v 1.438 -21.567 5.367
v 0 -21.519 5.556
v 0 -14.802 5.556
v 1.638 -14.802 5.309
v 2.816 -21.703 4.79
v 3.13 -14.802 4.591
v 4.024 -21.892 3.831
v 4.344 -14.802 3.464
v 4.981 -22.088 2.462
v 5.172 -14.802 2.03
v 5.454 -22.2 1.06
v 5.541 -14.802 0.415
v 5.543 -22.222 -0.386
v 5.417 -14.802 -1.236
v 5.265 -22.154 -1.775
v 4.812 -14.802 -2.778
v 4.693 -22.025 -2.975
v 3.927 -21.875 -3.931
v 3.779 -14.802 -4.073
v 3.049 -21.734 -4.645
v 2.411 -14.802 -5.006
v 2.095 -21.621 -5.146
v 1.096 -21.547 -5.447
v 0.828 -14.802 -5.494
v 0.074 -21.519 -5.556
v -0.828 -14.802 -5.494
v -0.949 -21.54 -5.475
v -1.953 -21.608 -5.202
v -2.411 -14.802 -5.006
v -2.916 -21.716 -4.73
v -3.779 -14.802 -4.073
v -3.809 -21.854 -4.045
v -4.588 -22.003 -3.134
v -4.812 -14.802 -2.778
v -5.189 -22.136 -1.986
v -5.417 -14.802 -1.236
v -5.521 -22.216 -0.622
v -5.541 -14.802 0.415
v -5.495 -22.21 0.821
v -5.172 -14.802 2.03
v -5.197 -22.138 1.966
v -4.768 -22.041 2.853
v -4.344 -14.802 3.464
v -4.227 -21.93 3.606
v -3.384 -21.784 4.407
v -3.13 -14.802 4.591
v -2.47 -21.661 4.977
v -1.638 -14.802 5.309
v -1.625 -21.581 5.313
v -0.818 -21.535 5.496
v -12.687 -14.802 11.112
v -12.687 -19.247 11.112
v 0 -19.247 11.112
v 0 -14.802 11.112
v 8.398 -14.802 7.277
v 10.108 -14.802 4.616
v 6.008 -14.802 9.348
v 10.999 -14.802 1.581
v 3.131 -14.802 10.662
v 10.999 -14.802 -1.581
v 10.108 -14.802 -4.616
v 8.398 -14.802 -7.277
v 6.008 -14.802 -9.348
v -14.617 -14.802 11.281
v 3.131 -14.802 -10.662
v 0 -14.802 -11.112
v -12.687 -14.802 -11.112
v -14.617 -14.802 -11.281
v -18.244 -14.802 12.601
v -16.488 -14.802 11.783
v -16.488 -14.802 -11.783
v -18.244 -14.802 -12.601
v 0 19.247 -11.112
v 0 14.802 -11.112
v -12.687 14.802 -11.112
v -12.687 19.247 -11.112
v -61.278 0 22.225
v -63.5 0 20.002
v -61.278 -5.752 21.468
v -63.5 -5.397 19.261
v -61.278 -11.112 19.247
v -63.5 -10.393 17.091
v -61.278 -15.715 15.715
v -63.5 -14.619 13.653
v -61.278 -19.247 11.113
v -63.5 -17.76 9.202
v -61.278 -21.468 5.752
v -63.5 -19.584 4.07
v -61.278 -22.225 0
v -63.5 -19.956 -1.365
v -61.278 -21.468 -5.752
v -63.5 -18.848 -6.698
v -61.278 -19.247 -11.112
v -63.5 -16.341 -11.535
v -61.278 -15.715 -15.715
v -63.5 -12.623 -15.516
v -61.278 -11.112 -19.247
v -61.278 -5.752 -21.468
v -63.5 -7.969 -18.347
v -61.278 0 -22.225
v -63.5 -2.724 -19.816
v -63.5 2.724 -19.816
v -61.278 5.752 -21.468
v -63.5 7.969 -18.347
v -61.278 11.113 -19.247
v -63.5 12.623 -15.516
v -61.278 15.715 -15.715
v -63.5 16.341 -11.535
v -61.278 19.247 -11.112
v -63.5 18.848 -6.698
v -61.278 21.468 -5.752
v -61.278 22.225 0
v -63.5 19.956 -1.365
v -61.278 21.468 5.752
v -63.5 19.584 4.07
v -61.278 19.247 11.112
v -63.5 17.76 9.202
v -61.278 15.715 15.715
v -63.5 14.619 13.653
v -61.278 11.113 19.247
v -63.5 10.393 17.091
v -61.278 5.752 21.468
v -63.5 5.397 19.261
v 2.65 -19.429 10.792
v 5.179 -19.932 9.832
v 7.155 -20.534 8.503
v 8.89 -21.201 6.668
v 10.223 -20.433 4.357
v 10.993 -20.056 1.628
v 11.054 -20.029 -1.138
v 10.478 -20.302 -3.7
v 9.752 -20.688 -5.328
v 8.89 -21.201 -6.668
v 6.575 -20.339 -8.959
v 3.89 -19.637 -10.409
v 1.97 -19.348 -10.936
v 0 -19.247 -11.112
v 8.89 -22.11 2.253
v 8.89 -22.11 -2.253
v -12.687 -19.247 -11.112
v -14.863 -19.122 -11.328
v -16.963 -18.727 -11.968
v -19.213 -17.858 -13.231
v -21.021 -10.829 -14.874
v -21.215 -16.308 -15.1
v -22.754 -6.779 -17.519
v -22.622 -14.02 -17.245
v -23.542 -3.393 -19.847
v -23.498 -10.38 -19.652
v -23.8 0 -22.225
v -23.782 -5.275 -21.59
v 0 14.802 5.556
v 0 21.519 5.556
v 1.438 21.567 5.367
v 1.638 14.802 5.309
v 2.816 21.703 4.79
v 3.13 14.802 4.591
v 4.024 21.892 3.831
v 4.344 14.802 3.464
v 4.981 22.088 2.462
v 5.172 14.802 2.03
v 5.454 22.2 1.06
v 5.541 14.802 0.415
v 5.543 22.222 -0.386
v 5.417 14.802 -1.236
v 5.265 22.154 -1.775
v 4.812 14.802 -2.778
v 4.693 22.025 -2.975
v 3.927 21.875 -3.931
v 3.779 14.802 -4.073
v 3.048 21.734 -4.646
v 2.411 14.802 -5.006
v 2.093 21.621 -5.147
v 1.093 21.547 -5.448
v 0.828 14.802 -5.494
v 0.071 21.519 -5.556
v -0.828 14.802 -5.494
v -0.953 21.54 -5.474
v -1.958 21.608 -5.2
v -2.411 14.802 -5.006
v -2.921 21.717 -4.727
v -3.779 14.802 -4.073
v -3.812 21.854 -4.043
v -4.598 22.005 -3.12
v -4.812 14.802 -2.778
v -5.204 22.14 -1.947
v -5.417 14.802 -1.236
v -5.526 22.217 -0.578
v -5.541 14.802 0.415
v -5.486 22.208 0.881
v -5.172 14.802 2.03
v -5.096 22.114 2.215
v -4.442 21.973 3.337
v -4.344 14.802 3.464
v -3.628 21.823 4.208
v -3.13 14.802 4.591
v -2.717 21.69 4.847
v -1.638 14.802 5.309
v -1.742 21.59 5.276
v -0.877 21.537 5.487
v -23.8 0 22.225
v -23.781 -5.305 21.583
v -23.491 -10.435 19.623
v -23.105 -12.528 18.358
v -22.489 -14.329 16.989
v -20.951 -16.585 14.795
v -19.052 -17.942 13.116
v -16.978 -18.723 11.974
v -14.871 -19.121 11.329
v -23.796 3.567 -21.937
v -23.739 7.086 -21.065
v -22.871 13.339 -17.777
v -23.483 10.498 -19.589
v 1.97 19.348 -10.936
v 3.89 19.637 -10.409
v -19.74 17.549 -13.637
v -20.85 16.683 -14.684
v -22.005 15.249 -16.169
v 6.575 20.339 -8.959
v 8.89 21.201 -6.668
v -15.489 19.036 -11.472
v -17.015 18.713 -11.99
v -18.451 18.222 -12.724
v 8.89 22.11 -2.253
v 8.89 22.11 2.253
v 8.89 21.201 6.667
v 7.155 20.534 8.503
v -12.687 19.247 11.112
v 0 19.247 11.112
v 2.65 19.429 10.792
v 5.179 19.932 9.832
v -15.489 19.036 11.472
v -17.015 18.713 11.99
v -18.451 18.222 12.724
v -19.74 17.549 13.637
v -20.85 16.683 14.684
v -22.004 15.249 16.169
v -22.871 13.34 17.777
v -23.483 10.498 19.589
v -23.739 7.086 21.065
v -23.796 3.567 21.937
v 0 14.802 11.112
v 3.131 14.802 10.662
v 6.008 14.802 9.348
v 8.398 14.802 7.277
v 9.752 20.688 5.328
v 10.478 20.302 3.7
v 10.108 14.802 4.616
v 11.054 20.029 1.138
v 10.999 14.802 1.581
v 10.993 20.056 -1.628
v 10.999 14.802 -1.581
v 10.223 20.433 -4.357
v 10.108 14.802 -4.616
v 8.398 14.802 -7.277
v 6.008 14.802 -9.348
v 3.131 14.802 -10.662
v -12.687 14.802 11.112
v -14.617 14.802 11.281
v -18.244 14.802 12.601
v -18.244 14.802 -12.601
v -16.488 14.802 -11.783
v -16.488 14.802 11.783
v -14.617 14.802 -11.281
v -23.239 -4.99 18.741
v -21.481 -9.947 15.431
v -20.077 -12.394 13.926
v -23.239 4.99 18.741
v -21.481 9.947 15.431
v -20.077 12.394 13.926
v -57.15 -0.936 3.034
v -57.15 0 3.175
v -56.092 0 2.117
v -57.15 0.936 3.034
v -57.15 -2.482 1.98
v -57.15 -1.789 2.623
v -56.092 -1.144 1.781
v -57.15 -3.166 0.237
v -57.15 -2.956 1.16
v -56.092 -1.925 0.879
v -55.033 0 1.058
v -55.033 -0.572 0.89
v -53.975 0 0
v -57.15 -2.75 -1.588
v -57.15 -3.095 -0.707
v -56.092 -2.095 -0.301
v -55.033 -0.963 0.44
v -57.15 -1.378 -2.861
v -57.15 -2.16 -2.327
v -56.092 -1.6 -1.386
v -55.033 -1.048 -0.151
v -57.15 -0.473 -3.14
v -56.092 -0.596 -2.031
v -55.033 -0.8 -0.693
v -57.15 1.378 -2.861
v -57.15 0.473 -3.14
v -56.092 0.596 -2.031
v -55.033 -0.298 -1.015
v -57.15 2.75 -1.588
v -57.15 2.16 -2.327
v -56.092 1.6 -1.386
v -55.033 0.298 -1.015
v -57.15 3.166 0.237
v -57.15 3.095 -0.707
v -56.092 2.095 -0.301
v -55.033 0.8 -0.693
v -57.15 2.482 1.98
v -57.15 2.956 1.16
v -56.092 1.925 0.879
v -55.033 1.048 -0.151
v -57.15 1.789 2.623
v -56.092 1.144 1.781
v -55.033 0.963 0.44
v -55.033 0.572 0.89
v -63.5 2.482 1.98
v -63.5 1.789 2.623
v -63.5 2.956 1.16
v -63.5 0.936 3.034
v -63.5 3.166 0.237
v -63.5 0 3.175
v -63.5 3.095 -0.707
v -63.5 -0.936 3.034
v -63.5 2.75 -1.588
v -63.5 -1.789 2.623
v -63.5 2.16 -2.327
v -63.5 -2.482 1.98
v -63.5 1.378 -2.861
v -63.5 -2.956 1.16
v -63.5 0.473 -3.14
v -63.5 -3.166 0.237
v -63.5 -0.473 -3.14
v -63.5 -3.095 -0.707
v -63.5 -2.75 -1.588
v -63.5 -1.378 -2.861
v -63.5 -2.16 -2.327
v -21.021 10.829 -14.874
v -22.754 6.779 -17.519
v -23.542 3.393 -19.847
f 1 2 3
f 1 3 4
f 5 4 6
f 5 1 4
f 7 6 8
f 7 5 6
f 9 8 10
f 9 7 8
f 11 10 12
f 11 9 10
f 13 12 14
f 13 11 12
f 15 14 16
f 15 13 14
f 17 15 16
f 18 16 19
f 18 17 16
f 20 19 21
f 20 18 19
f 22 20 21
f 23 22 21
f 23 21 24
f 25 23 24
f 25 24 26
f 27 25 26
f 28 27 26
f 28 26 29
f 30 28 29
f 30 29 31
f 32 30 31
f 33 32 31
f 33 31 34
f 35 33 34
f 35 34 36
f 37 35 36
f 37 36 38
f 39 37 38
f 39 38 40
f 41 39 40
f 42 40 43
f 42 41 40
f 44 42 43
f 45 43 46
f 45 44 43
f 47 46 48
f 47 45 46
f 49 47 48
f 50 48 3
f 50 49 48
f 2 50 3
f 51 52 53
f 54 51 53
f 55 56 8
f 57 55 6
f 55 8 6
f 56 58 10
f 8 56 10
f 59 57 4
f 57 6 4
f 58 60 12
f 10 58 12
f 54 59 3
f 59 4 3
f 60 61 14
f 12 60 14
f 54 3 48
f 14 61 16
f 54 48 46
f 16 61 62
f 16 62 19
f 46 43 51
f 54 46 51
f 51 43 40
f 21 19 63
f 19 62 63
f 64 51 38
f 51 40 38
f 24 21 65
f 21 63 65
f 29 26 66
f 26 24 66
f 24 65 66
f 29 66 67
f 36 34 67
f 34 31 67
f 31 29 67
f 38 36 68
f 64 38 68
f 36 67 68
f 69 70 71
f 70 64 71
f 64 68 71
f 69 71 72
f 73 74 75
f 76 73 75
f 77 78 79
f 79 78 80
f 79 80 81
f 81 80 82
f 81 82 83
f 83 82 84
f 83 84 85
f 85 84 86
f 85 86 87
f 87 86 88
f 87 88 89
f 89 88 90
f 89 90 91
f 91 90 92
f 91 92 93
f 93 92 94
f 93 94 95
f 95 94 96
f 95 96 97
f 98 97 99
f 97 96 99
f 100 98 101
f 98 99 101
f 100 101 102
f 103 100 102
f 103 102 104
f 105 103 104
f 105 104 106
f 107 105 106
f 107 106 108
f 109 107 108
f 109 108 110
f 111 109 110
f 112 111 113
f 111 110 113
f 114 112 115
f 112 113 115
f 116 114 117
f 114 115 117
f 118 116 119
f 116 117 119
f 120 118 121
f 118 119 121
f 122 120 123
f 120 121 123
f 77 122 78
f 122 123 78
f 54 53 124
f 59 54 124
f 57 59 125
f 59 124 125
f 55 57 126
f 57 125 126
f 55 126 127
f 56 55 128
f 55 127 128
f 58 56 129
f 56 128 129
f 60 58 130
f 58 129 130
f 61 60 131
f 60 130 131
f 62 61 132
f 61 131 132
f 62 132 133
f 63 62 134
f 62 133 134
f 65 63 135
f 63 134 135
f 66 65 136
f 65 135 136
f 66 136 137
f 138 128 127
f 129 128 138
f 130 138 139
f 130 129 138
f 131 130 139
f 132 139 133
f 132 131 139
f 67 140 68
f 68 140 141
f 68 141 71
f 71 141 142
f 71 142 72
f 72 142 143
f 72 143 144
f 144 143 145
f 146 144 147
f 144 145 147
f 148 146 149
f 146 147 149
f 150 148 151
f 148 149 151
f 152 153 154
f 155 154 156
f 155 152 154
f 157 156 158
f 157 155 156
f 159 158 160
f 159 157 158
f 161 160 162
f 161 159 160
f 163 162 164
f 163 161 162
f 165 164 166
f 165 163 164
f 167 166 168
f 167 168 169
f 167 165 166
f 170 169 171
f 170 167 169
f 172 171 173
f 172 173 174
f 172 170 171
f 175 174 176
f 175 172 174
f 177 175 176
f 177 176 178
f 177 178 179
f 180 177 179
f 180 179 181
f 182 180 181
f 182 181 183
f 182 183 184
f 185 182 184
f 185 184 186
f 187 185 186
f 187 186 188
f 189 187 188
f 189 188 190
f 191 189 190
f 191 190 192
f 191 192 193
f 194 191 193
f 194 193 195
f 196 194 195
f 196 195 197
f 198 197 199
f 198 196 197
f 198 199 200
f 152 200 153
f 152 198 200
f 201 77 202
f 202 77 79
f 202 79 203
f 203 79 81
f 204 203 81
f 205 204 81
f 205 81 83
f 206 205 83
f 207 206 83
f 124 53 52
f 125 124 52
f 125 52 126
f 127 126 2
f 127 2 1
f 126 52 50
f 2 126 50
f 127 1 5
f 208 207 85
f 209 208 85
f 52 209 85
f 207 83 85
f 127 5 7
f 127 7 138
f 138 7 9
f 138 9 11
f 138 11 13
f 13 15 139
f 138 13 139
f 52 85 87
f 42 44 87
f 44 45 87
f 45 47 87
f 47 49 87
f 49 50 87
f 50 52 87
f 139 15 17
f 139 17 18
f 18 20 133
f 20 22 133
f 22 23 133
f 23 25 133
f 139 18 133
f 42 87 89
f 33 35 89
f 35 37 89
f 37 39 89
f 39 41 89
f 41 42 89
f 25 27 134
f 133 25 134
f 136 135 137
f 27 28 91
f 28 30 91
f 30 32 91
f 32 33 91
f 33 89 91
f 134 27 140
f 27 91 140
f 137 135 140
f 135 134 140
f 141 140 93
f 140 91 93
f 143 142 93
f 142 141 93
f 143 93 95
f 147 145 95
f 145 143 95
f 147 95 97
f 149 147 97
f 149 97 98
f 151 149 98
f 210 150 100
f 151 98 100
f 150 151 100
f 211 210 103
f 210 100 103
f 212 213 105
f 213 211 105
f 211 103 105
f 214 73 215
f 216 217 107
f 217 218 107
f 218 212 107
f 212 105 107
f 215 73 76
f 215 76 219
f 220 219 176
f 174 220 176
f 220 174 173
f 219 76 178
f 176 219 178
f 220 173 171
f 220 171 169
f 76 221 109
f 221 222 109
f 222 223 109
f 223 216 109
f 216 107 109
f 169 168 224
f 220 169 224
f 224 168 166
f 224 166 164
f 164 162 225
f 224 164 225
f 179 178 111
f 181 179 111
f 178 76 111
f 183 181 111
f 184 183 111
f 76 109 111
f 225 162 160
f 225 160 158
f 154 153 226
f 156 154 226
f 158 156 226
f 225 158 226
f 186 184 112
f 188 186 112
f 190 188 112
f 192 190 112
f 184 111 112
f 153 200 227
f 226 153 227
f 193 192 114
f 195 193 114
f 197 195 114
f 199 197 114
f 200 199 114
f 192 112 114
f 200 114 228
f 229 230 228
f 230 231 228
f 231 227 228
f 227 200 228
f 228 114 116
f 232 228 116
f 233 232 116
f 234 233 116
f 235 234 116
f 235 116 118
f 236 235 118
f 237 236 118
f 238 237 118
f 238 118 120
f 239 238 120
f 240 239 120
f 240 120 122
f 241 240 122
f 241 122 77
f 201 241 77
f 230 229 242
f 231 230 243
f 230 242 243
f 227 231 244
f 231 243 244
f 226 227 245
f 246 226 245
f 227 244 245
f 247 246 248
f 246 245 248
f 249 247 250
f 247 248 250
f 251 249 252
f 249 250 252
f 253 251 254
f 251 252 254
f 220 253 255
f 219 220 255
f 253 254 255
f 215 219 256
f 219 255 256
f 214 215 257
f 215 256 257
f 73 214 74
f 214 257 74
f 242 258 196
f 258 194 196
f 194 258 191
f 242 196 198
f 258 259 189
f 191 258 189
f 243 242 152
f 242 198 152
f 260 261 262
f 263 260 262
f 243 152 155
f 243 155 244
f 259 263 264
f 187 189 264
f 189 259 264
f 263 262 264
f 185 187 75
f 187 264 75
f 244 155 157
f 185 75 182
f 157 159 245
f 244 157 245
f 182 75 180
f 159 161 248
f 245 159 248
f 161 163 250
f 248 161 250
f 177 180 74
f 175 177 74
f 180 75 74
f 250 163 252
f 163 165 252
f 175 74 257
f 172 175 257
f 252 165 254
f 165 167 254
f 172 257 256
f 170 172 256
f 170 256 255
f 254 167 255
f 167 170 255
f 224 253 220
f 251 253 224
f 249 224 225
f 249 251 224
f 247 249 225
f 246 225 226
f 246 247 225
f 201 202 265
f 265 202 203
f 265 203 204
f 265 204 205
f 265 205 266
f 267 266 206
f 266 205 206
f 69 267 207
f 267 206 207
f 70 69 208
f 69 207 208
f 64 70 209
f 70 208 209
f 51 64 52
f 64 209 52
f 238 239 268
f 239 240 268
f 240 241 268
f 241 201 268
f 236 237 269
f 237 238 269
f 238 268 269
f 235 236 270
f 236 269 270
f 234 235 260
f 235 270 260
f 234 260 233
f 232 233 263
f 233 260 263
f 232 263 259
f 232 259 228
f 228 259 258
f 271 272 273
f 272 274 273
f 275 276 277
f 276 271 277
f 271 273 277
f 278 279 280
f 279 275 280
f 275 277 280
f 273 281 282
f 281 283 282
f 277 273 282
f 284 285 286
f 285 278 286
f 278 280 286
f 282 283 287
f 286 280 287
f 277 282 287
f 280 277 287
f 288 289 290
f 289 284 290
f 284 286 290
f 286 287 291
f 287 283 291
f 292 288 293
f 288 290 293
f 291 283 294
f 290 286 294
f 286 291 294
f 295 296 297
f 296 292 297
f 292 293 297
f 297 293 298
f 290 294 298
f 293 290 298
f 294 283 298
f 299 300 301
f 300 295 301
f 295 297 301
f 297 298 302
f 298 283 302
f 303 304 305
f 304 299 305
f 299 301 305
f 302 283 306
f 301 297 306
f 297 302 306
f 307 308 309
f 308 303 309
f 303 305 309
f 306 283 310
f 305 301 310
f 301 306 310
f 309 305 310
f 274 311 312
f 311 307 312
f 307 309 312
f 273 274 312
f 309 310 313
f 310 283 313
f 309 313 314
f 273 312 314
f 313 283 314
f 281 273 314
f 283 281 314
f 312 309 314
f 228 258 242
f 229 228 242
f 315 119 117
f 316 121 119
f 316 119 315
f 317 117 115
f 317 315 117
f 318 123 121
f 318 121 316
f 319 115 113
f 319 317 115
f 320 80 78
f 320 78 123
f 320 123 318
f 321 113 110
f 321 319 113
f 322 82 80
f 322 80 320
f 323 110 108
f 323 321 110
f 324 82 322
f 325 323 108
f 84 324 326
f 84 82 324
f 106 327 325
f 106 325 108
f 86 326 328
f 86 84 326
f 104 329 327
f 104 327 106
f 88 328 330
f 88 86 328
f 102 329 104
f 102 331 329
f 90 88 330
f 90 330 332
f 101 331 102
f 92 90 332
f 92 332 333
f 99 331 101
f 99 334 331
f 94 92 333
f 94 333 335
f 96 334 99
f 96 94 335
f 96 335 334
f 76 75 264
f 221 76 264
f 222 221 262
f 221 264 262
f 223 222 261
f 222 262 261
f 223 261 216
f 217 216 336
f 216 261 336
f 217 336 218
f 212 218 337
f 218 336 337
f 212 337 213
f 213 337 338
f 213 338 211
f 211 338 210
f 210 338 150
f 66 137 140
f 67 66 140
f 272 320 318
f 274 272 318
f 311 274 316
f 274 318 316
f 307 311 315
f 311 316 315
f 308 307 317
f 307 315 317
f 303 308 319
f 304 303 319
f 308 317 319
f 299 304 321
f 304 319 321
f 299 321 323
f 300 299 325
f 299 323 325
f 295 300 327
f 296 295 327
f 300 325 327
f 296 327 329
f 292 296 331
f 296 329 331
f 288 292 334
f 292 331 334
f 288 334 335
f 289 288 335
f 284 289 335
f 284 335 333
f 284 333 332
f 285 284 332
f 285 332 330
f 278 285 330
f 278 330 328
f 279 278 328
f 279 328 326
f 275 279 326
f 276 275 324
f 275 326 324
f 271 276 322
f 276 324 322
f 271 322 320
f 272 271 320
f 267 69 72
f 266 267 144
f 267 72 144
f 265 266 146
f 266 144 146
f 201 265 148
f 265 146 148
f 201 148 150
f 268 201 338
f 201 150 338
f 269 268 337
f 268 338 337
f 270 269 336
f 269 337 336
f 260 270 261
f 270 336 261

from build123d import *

# Parameters (mm, degrees)
CHAMFER1_SIZE       = 2.2225
EXTRUDE1_DEPTH      = 71.853025694
EXTRUDE1_DEPTH_BACK = 71.853025694
EXTRUDE3_DEPTH      = 71.853025757
EXTRUDE3_DEPTH_BACK = 71.853025757
SKETCH4_R           = 3.175
EXTRUDE4_DEPTH      = 6.35
EXTRUDE6_DEPTH      = 71.853025757
EXTRUDE6_DEPTH_BACK = 71.853025757
SKETCH6_R           = 5.55625


with BuildPart() as part:
    # Sketch1 → Revolve1 (revolve)
    with BuildSketch(Plane(origin=(0, 0, 0), x_dir=(1, 0, 0), z_dir=(0, 1, 0)), mode=Mode.PRIVATE) as revolve1_sk:
        Polygon((-63.5, 22.225), (-23.01875, 22.225), (11.1125, 22.225), (11.1125, 0), (-63.5, 0), align=None)
    revolve(revolve1_sk.sketch.rotate(Axis((-63.5, 0, 0), (1, 0, 0)), 180), axis=Axis((-63.5, 0, 0), (1, 0, 0)))

    # Chamfer1
    chamfer1_edges = [part.edges().sort_by_distance(p)[0] for p in [
        (11.1125, 0, -22.225),
        (-63.5, 0, -22.225),
    ]]
    chamfer(chamfer1_edges, length=CHAMFER1_SIZE)

    # Sketch2 → Extrude1 (cut, two sides: drawn at the far end of the back side and taken through both)
    with BuildSketch(Plane(origin=(0, 0, 0), x_dir=(1, 0, 0), z_dir=(0, 1, 0)).offset(-EXTRUDE1_DEPTH_BACK)):
        with BuildLine():
            Line((-23.7998, 22.225), (22.225, 22.225))
            Line((22.225, 22.225), (22.225, -22.225))
            Line((22.225, -22.225), (-23.7998, -22.225))
            ThreePointArc((-23.7998, -22.225), (-20.545024106, -14.367275894), (-12.6873, -11.1125))
            Line((-12.6873, -11.1125), (0, -11.1125))
            ThreePointArc((0, -11.1125), (11.1125, 0), (0, 11.1125))
            Line((0, 11.1125), (-12.6873, 11.1125))
            ThreePointArc((-12.6873, 11.1125), (-20.545024106, 14.367275894), (-23.7998, 22.225))
        make_face()
    extrude(amount=EXTRUDE1_DEPTH + EXTRUDE1_DEPTH_BACK, mode=Mode.SUBTRACT)

    # Sketch3 → Extrude3 (cut, two sides: drawn at the far end of the back side and taken through both)
    with BuildSketch(Plane.XY.offset(-EXTRUDE3_DEPTH_BACK)):
        with BuildLine():
            Line((-18.24355, 14.80185), (22.225, 14.80185))
            Line((22.225, 14.80185), (22.225, -14.80185))
            Line((22.225, -14.80185), (-18.24355, -14.80185))
            ThreePointArc((-18.24355, -14.80185), (-23.7998, 0), (-18.24355, 14.80185))
        make_face()
    extrude(amount=EXTRUDE3_DEPTH + EXTRUDE3_DEPTH_BACK, mode=Mode.SUBTRACT)

    # Sketch4 → Extrude4 (cut)
    with BuildSketch(Plane.ZY.offset(63.5)):
        Circle(SKETCH4_R)
    extrude(amount=-EXTRUDE4_DEPTH, mode=Mode.SUBTRACT)

    # Extrude5 cone 1 section (through the dimple's axis) → Extrude5 (revolve, cut)
    with BuildSketch(Plane(origin=(-57.15, 0, 0), x_dir=(0, 0, 1), z_dir=(0, 1, 0))):
        Polygon((0, 0), (3.175, 0), (0, 3.175), align=None)
    revolve(axis=Axis((-57.15, 0, 0), (1, 0, 0)), mode=Mode.SUBTRACT)

    # Sketch6 → Extrude6 (cut, two sides: drawn at the far end of the back side and taken through both)
    with BuildSketch(Plane(origin=(0, 0, 0), x_dir=(1, 0, 0), z_dir=(0, 1, 0)).offset(-EXTRUDE6_DEPTH_BACK)):
        with Locations(Location((0, 0, 0), (0, 0, 270))):
            Circle(SKETCH6_R)
    extrude(amount=EXTRUDE6_DEPTH + EXTRUDE6_DEPTH_BACK, mode=Mode.SUBTRACT)


solid = part.part
